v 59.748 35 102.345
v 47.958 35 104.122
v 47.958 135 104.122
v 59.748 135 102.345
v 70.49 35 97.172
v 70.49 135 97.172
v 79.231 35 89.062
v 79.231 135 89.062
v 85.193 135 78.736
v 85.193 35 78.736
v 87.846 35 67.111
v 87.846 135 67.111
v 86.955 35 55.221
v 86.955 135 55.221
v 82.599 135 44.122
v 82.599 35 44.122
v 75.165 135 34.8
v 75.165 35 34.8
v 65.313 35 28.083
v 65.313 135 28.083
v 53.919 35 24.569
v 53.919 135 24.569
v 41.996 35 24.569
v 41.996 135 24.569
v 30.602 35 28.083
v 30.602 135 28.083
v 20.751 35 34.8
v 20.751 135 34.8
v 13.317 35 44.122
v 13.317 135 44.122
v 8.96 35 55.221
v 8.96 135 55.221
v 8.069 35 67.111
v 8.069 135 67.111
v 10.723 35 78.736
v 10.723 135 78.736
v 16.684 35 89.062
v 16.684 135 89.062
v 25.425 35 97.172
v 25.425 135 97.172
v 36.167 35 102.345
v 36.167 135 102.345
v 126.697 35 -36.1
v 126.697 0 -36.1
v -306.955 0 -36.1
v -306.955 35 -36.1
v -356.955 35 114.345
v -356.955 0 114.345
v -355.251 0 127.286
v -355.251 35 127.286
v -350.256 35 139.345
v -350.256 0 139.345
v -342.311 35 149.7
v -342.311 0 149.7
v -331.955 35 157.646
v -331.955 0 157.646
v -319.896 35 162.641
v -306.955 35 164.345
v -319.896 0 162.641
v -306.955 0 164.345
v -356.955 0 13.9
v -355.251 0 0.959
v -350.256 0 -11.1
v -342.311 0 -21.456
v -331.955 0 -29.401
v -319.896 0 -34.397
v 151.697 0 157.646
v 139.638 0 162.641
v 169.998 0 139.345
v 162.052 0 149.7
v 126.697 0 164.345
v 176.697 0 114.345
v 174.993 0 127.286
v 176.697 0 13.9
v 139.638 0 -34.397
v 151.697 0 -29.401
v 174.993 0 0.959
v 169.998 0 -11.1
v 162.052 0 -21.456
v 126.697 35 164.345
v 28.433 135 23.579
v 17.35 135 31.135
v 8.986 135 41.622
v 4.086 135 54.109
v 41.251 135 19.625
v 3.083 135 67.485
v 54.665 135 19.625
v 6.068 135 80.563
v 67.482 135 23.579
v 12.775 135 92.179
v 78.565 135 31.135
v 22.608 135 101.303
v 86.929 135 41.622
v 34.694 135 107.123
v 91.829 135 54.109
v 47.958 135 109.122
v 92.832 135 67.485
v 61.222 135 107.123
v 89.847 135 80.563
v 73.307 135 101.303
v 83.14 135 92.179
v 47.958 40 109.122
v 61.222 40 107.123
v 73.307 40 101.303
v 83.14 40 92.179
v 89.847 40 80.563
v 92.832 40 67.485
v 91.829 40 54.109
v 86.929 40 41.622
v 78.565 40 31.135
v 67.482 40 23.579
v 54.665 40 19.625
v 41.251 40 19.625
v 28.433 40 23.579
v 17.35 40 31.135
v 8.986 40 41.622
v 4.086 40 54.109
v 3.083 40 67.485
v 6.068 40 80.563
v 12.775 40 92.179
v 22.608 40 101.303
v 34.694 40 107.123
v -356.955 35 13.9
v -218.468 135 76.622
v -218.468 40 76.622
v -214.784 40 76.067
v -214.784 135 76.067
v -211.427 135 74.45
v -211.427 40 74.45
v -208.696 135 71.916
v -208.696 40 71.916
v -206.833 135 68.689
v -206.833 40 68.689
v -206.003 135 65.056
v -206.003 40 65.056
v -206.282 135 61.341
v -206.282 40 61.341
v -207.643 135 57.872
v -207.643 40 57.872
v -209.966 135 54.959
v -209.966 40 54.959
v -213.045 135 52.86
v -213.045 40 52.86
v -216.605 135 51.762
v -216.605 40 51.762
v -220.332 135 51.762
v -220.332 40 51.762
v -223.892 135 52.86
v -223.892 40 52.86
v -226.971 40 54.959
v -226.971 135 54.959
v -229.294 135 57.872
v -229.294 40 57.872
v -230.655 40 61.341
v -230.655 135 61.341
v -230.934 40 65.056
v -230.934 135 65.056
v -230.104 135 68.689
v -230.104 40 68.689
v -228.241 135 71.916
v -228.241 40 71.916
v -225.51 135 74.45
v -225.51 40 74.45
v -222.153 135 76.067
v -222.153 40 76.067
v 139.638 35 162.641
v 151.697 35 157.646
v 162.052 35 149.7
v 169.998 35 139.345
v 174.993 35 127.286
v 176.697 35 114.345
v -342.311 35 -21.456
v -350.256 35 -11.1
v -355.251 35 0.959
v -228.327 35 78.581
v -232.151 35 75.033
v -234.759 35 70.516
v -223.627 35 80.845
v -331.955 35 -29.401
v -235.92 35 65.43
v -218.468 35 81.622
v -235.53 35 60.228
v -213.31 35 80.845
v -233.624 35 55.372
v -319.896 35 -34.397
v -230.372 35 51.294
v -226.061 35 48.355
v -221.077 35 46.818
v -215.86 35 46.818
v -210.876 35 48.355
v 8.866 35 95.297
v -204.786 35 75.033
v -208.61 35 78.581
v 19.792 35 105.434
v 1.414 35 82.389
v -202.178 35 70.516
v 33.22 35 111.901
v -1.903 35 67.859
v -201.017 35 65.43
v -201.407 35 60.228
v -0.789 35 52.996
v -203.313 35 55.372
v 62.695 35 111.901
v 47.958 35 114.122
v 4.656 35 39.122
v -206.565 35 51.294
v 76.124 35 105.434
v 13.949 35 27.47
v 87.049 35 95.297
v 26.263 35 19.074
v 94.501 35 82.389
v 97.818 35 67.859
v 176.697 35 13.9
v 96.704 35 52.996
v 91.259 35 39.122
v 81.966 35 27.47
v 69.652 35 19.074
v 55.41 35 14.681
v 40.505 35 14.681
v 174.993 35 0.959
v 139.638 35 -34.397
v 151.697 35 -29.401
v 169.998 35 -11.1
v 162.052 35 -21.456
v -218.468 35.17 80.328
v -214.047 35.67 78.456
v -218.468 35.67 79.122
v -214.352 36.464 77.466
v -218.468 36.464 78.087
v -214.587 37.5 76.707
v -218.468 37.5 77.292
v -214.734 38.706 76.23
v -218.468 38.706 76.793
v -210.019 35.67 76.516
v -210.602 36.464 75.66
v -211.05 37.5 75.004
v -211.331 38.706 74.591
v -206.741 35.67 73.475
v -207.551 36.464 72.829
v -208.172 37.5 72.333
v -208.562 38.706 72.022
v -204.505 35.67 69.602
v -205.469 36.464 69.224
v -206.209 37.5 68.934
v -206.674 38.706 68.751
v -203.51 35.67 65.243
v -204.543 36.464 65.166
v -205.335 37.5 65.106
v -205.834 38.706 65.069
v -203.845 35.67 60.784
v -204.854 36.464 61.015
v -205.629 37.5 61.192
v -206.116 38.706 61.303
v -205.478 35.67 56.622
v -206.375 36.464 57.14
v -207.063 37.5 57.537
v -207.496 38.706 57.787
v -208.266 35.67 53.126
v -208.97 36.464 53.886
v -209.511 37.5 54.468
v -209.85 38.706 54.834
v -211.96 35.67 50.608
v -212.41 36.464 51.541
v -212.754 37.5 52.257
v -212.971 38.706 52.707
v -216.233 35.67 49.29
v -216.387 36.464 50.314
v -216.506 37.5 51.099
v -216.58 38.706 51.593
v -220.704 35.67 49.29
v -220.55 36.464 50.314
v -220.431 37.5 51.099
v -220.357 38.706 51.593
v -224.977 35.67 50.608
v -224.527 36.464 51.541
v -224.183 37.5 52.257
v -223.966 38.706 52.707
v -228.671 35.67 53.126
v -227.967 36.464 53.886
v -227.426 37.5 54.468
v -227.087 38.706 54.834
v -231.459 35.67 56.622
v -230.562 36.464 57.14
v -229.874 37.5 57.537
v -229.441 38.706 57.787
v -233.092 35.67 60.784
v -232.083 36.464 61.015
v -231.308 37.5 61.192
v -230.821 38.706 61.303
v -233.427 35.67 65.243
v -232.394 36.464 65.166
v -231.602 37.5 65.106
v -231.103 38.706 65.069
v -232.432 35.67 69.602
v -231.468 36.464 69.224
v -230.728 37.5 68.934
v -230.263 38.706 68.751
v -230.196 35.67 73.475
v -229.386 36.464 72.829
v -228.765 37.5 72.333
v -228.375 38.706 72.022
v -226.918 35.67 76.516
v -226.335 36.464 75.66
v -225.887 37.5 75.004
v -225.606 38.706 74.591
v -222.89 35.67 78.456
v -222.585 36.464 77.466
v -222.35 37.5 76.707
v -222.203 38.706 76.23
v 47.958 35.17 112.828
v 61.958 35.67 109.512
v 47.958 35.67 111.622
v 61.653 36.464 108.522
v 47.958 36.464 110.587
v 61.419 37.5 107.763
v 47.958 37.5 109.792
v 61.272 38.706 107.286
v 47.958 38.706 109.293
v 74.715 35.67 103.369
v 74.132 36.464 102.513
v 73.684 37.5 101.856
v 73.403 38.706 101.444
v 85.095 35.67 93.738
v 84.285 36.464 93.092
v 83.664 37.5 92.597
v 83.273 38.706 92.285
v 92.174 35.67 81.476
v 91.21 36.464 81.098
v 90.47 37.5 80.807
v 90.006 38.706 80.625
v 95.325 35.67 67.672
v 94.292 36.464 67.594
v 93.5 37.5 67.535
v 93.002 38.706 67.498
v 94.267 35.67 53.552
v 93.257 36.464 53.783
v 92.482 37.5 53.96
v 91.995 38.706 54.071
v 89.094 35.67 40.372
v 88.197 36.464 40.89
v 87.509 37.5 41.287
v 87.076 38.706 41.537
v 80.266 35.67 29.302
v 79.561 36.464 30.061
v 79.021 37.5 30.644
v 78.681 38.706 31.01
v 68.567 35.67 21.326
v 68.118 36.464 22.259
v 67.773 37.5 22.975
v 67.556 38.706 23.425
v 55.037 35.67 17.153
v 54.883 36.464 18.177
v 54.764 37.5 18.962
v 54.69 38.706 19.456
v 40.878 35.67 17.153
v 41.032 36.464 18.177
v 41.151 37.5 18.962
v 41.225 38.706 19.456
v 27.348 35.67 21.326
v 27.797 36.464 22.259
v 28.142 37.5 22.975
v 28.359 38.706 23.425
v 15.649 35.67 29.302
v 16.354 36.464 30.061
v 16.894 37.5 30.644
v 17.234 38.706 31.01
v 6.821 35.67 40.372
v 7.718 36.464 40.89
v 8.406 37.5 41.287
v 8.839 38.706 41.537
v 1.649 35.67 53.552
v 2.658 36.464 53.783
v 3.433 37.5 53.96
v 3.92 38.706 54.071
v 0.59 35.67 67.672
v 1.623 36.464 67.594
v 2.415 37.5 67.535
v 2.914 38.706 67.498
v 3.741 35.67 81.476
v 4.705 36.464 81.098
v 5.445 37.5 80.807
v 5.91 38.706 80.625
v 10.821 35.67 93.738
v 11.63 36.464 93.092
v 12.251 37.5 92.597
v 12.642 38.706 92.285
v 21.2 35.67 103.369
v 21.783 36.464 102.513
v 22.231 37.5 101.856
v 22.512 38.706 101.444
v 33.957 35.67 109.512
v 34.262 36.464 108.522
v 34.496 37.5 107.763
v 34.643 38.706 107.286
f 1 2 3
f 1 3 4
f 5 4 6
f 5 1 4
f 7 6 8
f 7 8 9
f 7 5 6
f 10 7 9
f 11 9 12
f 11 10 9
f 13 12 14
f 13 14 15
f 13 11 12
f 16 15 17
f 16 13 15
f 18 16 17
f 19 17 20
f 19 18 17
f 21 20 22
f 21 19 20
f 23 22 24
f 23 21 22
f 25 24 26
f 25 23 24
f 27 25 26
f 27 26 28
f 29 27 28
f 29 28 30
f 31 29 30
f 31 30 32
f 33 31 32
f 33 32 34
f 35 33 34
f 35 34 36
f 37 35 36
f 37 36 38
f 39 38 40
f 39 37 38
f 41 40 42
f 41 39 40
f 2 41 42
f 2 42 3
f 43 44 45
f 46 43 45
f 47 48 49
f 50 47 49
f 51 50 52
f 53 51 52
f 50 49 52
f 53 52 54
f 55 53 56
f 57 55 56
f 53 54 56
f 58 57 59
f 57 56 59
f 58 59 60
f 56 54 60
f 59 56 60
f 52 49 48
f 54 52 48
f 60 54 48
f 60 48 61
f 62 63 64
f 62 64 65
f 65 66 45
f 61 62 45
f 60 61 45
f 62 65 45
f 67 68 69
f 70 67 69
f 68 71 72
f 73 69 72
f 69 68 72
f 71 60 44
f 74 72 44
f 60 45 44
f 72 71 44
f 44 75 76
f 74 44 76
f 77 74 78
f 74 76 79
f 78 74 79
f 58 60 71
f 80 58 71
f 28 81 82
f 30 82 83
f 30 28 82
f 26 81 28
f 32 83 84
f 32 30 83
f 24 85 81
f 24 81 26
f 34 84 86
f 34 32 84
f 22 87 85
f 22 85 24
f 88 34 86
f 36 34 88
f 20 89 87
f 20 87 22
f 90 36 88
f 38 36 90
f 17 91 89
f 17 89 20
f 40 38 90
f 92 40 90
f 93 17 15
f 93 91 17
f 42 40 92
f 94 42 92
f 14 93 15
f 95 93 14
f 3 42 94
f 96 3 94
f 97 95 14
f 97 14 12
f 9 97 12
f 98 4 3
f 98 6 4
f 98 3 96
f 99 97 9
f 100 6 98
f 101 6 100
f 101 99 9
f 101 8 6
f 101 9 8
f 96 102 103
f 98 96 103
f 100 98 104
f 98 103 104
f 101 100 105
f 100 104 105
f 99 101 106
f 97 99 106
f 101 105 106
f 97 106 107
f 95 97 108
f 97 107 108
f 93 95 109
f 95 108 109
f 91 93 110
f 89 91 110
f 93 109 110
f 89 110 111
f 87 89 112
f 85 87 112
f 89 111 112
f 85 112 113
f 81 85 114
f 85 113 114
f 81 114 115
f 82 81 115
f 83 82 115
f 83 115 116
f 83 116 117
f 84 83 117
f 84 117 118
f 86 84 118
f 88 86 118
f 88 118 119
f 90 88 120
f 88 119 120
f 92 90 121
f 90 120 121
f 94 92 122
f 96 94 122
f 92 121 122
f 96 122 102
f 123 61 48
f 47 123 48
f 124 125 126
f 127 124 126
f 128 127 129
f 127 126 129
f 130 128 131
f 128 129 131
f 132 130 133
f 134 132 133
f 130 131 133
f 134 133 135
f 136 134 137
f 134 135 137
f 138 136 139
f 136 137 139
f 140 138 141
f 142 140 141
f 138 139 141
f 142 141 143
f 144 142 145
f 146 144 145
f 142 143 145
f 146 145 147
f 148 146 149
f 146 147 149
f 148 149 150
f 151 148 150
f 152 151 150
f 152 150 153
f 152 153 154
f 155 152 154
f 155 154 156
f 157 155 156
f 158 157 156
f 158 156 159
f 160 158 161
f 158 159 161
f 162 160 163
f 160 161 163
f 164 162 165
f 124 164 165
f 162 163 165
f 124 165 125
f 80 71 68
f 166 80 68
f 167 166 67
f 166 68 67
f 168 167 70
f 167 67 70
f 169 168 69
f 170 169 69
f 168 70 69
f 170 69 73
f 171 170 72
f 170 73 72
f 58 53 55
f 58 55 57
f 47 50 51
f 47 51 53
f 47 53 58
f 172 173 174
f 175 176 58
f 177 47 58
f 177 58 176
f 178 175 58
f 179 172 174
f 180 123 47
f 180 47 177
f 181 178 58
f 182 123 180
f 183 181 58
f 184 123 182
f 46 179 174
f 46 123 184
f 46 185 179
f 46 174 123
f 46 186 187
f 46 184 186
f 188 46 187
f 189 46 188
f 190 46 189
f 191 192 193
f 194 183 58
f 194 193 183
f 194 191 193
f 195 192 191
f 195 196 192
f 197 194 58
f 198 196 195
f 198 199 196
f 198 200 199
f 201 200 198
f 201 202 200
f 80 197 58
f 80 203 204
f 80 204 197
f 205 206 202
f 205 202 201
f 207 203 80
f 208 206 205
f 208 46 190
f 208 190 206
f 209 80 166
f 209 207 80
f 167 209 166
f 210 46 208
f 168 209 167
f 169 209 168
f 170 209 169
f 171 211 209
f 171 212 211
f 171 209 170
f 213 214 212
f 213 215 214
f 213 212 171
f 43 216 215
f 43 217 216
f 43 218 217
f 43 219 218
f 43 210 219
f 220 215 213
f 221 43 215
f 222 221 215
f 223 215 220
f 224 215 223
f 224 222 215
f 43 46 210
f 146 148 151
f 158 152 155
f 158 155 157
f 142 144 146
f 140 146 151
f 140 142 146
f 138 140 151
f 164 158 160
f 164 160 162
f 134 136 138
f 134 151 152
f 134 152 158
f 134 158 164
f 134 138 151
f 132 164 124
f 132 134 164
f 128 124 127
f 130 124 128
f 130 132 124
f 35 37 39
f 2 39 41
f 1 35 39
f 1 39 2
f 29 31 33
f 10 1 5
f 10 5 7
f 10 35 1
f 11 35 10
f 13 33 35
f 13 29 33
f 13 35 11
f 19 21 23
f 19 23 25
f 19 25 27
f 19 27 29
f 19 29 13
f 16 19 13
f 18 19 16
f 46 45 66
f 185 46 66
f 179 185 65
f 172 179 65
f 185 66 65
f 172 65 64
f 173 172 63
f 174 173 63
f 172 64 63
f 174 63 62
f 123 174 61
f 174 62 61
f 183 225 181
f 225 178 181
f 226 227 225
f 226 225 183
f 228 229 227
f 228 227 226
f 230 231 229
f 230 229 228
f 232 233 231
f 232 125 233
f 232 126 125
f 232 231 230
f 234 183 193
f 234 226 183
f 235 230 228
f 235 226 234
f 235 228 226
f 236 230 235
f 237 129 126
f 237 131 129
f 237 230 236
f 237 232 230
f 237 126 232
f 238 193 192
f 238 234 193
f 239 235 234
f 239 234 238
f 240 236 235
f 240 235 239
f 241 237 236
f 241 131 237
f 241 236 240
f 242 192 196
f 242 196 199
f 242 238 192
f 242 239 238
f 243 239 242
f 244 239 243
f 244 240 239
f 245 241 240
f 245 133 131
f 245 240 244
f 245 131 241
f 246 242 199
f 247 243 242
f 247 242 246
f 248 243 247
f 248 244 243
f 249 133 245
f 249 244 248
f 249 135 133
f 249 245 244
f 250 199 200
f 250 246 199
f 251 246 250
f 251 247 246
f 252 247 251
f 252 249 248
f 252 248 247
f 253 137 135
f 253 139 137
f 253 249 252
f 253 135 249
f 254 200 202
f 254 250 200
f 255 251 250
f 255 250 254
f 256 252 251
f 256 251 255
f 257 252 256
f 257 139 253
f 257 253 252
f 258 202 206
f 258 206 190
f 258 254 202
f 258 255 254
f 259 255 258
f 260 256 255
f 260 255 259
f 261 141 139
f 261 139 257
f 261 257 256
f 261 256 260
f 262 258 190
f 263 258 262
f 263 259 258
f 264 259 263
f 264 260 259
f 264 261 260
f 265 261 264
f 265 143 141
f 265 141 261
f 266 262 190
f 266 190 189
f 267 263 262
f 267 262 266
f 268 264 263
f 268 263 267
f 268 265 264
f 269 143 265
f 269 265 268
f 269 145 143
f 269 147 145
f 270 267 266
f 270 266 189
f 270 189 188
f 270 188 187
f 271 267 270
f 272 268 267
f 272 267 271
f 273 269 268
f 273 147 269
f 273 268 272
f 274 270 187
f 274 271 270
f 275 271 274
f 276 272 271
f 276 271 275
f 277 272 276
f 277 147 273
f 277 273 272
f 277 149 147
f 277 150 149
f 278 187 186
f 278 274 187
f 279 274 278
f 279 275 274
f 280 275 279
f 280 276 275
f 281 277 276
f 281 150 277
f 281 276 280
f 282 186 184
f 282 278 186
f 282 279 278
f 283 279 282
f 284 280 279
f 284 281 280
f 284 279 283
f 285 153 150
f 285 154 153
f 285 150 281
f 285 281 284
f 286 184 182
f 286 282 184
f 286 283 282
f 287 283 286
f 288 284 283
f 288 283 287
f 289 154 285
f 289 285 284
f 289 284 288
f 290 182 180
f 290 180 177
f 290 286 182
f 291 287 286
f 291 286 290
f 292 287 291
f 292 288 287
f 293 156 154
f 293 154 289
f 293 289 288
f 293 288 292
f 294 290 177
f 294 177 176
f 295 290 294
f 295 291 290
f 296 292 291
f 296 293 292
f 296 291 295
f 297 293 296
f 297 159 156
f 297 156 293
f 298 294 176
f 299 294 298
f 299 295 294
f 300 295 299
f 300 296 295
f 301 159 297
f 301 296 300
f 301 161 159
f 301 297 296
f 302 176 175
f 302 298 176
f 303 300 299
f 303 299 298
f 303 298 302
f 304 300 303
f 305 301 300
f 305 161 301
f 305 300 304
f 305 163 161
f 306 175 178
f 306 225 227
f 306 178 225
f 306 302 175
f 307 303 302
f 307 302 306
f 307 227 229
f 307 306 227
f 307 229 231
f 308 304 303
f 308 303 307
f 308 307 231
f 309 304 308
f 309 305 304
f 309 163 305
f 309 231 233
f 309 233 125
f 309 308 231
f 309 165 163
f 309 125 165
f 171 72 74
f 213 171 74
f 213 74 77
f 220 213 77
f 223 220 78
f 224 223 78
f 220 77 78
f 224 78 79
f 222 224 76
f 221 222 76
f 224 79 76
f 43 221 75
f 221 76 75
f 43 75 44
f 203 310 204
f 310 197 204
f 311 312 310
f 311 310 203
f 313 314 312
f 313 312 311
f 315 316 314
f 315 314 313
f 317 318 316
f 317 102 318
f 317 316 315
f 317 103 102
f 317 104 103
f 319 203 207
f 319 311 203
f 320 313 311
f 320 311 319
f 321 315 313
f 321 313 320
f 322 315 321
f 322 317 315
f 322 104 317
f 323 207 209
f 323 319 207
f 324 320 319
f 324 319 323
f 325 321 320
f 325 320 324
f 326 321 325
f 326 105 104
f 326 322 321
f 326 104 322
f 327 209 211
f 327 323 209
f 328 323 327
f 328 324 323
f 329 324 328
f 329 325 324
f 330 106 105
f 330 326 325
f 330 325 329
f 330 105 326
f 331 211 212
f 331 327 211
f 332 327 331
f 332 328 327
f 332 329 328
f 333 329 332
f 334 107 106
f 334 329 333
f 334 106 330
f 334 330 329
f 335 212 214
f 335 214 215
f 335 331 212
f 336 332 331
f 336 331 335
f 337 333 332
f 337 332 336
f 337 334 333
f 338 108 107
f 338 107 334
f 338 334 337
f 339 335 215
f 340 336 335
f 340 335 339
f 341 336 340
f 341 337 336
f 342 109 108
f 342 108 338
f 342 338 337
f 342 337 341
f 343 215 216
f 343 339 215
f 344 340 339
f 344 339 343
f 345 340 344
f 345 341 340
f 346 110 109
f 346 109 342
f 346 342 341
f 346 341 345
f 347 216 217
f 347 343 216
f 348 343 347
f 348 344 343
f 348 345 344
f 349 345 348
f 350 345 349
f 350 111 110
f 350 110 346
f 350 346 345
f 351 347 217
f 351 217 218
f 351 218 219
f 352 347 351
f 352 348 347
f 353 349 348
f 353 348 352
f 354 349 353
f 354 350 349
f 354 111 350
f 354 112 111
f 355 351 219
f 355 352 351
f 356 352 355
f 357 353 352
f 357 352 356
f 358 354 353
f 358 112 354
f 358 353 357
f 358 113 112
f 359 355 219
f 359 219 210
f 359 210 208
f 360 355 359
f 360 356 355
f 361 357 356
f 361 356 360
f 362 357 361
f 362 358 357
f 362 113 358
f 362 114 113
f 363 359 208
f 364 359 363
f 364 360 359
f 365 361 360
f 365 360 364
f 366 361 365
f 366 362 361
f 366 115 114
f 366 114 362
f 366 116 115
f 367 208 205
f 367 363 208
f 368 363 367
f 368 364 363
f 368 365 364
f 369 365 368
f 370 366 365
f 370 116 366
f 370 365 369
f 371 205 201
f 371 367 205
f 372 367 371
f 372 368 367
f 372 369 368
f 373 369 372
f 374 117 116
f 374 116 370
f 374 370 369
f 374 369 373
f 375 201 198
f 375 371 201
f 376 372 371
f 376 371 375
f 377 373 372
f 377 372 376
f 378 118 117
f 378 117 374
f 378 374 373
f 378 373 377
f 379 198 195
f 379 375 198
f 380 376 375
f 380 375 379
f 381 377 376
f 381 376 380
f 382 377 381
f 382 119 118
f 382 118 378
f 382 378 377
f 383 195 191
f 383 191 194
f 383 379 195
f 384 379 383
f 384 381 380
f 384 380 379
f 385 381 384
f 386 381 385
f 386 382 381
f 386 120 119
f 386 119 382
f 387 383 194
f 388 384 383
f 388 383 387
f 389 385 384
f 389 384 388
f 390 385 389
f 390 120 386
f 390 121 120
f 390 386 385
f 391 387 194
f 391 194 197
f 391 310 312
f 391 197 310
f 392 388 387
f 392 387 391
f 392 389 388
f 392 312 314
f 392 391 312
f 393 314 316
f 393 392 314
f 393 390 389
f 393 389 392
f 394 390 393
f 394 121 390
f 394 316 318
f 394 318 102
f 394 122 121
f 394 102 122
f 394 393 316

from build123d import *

# Parameters (mm, degrees)
BOSS_EXTRUDE1_DEPTH = 7
SKETCH2_R           = 2.5
SKETCH2_R_2         = 9
SKETCH2_R_3         = 8
BOSS_EXTRUDE2_DEPTH = 20
FILLET1_R           = 1
SCALE1_SCALE        = 5


with BuildPart() as part:
    # Sketch1 → Boss-Extrude1 (new body)
    with BuildSketch(Plane(origin=(0, 0, 0), x_dir=(1, 0, 0), z_dir=(0, 1, 0))):
        with BuildLine():
            Line((-61.391033774, -32.868924483), (25.33933743, -32.868924483))
            ThreePointArc((25.33933743, -32.868924483), (32.410405242, -29.939992295), (35.33933743, -22.868924483))
            Line((35.33933743, -22.868924483), (35.33933743, -2.779955787))
            ThreePointArc((35.33933743, -2.779955787), (32.410405242, 4.291112025), (25.33933743, 7.220044213))
            Line((25.33933743, 7.220044213), (-61.391033774, 7.220044213))
            ThreePointArc((-61.391033774, 7.220044213), (-68.462101586, 4.291112025), (-71.391033774, -2.779955787))
            Line((-71.391033774, -2.779955787), (-71.391033774, -22.868924483))
            ThreePointArc((-71.391033774, -22.868924483), (-68.462101586, -29.939992295), (-61.391033774, -32.868924483))
        make_face()
    extrude(amount=BOSS_EXTRUDE1_DEPTH)

    # Sketch2 → Boss-Extrude2 (add)
    # profile 1 of 2: a face of its own
    with BuildSketch(Plane(origin=(0, 7, 0), x_dir=(1, 0, 0), z_dir=(0, 1, 0))):
        with Locations(Location((-43.693698634, -12.824440135, 0), (0, 0, 270))):
            Circle(SKETCH2_R)
    # profile 2 of 2: a face of its own
    with BuildSketch(Plane(origin=(0, 7, 0), x_dir=(1, 0, 0), z_dir=(0, 1, 0))):
        with Locations(Location((9.591521865, -12.824440135, 0), (0, 0, 270))):
            Circle(SKETCH2_R_2)
        with Locations(Location((9.591521865, -12.824440135, 0), (0, 0, 270))):
            Circle(SKETCH2_R_3, mode=Mode.SUBTRACT)
    extrude(amount=BOSS_EXTRUDE2_DEPTH)

    # Fillet1
    fillet1_edges = [part.edges().sort_by_distance(p)[0] for p in [
        (-43.693698634, 7, 10.324440135),
        (9.591521865, 7, 3.824440135),
    ]]
    fillet(fillet1_edges, radius=FILLET1_R)


with BuildPart() as part_1:
    # Scale1: scaled about (0, 0, 0)
    add(part.part.scale(SCALE1_SCALE))


solid = part_1.part
